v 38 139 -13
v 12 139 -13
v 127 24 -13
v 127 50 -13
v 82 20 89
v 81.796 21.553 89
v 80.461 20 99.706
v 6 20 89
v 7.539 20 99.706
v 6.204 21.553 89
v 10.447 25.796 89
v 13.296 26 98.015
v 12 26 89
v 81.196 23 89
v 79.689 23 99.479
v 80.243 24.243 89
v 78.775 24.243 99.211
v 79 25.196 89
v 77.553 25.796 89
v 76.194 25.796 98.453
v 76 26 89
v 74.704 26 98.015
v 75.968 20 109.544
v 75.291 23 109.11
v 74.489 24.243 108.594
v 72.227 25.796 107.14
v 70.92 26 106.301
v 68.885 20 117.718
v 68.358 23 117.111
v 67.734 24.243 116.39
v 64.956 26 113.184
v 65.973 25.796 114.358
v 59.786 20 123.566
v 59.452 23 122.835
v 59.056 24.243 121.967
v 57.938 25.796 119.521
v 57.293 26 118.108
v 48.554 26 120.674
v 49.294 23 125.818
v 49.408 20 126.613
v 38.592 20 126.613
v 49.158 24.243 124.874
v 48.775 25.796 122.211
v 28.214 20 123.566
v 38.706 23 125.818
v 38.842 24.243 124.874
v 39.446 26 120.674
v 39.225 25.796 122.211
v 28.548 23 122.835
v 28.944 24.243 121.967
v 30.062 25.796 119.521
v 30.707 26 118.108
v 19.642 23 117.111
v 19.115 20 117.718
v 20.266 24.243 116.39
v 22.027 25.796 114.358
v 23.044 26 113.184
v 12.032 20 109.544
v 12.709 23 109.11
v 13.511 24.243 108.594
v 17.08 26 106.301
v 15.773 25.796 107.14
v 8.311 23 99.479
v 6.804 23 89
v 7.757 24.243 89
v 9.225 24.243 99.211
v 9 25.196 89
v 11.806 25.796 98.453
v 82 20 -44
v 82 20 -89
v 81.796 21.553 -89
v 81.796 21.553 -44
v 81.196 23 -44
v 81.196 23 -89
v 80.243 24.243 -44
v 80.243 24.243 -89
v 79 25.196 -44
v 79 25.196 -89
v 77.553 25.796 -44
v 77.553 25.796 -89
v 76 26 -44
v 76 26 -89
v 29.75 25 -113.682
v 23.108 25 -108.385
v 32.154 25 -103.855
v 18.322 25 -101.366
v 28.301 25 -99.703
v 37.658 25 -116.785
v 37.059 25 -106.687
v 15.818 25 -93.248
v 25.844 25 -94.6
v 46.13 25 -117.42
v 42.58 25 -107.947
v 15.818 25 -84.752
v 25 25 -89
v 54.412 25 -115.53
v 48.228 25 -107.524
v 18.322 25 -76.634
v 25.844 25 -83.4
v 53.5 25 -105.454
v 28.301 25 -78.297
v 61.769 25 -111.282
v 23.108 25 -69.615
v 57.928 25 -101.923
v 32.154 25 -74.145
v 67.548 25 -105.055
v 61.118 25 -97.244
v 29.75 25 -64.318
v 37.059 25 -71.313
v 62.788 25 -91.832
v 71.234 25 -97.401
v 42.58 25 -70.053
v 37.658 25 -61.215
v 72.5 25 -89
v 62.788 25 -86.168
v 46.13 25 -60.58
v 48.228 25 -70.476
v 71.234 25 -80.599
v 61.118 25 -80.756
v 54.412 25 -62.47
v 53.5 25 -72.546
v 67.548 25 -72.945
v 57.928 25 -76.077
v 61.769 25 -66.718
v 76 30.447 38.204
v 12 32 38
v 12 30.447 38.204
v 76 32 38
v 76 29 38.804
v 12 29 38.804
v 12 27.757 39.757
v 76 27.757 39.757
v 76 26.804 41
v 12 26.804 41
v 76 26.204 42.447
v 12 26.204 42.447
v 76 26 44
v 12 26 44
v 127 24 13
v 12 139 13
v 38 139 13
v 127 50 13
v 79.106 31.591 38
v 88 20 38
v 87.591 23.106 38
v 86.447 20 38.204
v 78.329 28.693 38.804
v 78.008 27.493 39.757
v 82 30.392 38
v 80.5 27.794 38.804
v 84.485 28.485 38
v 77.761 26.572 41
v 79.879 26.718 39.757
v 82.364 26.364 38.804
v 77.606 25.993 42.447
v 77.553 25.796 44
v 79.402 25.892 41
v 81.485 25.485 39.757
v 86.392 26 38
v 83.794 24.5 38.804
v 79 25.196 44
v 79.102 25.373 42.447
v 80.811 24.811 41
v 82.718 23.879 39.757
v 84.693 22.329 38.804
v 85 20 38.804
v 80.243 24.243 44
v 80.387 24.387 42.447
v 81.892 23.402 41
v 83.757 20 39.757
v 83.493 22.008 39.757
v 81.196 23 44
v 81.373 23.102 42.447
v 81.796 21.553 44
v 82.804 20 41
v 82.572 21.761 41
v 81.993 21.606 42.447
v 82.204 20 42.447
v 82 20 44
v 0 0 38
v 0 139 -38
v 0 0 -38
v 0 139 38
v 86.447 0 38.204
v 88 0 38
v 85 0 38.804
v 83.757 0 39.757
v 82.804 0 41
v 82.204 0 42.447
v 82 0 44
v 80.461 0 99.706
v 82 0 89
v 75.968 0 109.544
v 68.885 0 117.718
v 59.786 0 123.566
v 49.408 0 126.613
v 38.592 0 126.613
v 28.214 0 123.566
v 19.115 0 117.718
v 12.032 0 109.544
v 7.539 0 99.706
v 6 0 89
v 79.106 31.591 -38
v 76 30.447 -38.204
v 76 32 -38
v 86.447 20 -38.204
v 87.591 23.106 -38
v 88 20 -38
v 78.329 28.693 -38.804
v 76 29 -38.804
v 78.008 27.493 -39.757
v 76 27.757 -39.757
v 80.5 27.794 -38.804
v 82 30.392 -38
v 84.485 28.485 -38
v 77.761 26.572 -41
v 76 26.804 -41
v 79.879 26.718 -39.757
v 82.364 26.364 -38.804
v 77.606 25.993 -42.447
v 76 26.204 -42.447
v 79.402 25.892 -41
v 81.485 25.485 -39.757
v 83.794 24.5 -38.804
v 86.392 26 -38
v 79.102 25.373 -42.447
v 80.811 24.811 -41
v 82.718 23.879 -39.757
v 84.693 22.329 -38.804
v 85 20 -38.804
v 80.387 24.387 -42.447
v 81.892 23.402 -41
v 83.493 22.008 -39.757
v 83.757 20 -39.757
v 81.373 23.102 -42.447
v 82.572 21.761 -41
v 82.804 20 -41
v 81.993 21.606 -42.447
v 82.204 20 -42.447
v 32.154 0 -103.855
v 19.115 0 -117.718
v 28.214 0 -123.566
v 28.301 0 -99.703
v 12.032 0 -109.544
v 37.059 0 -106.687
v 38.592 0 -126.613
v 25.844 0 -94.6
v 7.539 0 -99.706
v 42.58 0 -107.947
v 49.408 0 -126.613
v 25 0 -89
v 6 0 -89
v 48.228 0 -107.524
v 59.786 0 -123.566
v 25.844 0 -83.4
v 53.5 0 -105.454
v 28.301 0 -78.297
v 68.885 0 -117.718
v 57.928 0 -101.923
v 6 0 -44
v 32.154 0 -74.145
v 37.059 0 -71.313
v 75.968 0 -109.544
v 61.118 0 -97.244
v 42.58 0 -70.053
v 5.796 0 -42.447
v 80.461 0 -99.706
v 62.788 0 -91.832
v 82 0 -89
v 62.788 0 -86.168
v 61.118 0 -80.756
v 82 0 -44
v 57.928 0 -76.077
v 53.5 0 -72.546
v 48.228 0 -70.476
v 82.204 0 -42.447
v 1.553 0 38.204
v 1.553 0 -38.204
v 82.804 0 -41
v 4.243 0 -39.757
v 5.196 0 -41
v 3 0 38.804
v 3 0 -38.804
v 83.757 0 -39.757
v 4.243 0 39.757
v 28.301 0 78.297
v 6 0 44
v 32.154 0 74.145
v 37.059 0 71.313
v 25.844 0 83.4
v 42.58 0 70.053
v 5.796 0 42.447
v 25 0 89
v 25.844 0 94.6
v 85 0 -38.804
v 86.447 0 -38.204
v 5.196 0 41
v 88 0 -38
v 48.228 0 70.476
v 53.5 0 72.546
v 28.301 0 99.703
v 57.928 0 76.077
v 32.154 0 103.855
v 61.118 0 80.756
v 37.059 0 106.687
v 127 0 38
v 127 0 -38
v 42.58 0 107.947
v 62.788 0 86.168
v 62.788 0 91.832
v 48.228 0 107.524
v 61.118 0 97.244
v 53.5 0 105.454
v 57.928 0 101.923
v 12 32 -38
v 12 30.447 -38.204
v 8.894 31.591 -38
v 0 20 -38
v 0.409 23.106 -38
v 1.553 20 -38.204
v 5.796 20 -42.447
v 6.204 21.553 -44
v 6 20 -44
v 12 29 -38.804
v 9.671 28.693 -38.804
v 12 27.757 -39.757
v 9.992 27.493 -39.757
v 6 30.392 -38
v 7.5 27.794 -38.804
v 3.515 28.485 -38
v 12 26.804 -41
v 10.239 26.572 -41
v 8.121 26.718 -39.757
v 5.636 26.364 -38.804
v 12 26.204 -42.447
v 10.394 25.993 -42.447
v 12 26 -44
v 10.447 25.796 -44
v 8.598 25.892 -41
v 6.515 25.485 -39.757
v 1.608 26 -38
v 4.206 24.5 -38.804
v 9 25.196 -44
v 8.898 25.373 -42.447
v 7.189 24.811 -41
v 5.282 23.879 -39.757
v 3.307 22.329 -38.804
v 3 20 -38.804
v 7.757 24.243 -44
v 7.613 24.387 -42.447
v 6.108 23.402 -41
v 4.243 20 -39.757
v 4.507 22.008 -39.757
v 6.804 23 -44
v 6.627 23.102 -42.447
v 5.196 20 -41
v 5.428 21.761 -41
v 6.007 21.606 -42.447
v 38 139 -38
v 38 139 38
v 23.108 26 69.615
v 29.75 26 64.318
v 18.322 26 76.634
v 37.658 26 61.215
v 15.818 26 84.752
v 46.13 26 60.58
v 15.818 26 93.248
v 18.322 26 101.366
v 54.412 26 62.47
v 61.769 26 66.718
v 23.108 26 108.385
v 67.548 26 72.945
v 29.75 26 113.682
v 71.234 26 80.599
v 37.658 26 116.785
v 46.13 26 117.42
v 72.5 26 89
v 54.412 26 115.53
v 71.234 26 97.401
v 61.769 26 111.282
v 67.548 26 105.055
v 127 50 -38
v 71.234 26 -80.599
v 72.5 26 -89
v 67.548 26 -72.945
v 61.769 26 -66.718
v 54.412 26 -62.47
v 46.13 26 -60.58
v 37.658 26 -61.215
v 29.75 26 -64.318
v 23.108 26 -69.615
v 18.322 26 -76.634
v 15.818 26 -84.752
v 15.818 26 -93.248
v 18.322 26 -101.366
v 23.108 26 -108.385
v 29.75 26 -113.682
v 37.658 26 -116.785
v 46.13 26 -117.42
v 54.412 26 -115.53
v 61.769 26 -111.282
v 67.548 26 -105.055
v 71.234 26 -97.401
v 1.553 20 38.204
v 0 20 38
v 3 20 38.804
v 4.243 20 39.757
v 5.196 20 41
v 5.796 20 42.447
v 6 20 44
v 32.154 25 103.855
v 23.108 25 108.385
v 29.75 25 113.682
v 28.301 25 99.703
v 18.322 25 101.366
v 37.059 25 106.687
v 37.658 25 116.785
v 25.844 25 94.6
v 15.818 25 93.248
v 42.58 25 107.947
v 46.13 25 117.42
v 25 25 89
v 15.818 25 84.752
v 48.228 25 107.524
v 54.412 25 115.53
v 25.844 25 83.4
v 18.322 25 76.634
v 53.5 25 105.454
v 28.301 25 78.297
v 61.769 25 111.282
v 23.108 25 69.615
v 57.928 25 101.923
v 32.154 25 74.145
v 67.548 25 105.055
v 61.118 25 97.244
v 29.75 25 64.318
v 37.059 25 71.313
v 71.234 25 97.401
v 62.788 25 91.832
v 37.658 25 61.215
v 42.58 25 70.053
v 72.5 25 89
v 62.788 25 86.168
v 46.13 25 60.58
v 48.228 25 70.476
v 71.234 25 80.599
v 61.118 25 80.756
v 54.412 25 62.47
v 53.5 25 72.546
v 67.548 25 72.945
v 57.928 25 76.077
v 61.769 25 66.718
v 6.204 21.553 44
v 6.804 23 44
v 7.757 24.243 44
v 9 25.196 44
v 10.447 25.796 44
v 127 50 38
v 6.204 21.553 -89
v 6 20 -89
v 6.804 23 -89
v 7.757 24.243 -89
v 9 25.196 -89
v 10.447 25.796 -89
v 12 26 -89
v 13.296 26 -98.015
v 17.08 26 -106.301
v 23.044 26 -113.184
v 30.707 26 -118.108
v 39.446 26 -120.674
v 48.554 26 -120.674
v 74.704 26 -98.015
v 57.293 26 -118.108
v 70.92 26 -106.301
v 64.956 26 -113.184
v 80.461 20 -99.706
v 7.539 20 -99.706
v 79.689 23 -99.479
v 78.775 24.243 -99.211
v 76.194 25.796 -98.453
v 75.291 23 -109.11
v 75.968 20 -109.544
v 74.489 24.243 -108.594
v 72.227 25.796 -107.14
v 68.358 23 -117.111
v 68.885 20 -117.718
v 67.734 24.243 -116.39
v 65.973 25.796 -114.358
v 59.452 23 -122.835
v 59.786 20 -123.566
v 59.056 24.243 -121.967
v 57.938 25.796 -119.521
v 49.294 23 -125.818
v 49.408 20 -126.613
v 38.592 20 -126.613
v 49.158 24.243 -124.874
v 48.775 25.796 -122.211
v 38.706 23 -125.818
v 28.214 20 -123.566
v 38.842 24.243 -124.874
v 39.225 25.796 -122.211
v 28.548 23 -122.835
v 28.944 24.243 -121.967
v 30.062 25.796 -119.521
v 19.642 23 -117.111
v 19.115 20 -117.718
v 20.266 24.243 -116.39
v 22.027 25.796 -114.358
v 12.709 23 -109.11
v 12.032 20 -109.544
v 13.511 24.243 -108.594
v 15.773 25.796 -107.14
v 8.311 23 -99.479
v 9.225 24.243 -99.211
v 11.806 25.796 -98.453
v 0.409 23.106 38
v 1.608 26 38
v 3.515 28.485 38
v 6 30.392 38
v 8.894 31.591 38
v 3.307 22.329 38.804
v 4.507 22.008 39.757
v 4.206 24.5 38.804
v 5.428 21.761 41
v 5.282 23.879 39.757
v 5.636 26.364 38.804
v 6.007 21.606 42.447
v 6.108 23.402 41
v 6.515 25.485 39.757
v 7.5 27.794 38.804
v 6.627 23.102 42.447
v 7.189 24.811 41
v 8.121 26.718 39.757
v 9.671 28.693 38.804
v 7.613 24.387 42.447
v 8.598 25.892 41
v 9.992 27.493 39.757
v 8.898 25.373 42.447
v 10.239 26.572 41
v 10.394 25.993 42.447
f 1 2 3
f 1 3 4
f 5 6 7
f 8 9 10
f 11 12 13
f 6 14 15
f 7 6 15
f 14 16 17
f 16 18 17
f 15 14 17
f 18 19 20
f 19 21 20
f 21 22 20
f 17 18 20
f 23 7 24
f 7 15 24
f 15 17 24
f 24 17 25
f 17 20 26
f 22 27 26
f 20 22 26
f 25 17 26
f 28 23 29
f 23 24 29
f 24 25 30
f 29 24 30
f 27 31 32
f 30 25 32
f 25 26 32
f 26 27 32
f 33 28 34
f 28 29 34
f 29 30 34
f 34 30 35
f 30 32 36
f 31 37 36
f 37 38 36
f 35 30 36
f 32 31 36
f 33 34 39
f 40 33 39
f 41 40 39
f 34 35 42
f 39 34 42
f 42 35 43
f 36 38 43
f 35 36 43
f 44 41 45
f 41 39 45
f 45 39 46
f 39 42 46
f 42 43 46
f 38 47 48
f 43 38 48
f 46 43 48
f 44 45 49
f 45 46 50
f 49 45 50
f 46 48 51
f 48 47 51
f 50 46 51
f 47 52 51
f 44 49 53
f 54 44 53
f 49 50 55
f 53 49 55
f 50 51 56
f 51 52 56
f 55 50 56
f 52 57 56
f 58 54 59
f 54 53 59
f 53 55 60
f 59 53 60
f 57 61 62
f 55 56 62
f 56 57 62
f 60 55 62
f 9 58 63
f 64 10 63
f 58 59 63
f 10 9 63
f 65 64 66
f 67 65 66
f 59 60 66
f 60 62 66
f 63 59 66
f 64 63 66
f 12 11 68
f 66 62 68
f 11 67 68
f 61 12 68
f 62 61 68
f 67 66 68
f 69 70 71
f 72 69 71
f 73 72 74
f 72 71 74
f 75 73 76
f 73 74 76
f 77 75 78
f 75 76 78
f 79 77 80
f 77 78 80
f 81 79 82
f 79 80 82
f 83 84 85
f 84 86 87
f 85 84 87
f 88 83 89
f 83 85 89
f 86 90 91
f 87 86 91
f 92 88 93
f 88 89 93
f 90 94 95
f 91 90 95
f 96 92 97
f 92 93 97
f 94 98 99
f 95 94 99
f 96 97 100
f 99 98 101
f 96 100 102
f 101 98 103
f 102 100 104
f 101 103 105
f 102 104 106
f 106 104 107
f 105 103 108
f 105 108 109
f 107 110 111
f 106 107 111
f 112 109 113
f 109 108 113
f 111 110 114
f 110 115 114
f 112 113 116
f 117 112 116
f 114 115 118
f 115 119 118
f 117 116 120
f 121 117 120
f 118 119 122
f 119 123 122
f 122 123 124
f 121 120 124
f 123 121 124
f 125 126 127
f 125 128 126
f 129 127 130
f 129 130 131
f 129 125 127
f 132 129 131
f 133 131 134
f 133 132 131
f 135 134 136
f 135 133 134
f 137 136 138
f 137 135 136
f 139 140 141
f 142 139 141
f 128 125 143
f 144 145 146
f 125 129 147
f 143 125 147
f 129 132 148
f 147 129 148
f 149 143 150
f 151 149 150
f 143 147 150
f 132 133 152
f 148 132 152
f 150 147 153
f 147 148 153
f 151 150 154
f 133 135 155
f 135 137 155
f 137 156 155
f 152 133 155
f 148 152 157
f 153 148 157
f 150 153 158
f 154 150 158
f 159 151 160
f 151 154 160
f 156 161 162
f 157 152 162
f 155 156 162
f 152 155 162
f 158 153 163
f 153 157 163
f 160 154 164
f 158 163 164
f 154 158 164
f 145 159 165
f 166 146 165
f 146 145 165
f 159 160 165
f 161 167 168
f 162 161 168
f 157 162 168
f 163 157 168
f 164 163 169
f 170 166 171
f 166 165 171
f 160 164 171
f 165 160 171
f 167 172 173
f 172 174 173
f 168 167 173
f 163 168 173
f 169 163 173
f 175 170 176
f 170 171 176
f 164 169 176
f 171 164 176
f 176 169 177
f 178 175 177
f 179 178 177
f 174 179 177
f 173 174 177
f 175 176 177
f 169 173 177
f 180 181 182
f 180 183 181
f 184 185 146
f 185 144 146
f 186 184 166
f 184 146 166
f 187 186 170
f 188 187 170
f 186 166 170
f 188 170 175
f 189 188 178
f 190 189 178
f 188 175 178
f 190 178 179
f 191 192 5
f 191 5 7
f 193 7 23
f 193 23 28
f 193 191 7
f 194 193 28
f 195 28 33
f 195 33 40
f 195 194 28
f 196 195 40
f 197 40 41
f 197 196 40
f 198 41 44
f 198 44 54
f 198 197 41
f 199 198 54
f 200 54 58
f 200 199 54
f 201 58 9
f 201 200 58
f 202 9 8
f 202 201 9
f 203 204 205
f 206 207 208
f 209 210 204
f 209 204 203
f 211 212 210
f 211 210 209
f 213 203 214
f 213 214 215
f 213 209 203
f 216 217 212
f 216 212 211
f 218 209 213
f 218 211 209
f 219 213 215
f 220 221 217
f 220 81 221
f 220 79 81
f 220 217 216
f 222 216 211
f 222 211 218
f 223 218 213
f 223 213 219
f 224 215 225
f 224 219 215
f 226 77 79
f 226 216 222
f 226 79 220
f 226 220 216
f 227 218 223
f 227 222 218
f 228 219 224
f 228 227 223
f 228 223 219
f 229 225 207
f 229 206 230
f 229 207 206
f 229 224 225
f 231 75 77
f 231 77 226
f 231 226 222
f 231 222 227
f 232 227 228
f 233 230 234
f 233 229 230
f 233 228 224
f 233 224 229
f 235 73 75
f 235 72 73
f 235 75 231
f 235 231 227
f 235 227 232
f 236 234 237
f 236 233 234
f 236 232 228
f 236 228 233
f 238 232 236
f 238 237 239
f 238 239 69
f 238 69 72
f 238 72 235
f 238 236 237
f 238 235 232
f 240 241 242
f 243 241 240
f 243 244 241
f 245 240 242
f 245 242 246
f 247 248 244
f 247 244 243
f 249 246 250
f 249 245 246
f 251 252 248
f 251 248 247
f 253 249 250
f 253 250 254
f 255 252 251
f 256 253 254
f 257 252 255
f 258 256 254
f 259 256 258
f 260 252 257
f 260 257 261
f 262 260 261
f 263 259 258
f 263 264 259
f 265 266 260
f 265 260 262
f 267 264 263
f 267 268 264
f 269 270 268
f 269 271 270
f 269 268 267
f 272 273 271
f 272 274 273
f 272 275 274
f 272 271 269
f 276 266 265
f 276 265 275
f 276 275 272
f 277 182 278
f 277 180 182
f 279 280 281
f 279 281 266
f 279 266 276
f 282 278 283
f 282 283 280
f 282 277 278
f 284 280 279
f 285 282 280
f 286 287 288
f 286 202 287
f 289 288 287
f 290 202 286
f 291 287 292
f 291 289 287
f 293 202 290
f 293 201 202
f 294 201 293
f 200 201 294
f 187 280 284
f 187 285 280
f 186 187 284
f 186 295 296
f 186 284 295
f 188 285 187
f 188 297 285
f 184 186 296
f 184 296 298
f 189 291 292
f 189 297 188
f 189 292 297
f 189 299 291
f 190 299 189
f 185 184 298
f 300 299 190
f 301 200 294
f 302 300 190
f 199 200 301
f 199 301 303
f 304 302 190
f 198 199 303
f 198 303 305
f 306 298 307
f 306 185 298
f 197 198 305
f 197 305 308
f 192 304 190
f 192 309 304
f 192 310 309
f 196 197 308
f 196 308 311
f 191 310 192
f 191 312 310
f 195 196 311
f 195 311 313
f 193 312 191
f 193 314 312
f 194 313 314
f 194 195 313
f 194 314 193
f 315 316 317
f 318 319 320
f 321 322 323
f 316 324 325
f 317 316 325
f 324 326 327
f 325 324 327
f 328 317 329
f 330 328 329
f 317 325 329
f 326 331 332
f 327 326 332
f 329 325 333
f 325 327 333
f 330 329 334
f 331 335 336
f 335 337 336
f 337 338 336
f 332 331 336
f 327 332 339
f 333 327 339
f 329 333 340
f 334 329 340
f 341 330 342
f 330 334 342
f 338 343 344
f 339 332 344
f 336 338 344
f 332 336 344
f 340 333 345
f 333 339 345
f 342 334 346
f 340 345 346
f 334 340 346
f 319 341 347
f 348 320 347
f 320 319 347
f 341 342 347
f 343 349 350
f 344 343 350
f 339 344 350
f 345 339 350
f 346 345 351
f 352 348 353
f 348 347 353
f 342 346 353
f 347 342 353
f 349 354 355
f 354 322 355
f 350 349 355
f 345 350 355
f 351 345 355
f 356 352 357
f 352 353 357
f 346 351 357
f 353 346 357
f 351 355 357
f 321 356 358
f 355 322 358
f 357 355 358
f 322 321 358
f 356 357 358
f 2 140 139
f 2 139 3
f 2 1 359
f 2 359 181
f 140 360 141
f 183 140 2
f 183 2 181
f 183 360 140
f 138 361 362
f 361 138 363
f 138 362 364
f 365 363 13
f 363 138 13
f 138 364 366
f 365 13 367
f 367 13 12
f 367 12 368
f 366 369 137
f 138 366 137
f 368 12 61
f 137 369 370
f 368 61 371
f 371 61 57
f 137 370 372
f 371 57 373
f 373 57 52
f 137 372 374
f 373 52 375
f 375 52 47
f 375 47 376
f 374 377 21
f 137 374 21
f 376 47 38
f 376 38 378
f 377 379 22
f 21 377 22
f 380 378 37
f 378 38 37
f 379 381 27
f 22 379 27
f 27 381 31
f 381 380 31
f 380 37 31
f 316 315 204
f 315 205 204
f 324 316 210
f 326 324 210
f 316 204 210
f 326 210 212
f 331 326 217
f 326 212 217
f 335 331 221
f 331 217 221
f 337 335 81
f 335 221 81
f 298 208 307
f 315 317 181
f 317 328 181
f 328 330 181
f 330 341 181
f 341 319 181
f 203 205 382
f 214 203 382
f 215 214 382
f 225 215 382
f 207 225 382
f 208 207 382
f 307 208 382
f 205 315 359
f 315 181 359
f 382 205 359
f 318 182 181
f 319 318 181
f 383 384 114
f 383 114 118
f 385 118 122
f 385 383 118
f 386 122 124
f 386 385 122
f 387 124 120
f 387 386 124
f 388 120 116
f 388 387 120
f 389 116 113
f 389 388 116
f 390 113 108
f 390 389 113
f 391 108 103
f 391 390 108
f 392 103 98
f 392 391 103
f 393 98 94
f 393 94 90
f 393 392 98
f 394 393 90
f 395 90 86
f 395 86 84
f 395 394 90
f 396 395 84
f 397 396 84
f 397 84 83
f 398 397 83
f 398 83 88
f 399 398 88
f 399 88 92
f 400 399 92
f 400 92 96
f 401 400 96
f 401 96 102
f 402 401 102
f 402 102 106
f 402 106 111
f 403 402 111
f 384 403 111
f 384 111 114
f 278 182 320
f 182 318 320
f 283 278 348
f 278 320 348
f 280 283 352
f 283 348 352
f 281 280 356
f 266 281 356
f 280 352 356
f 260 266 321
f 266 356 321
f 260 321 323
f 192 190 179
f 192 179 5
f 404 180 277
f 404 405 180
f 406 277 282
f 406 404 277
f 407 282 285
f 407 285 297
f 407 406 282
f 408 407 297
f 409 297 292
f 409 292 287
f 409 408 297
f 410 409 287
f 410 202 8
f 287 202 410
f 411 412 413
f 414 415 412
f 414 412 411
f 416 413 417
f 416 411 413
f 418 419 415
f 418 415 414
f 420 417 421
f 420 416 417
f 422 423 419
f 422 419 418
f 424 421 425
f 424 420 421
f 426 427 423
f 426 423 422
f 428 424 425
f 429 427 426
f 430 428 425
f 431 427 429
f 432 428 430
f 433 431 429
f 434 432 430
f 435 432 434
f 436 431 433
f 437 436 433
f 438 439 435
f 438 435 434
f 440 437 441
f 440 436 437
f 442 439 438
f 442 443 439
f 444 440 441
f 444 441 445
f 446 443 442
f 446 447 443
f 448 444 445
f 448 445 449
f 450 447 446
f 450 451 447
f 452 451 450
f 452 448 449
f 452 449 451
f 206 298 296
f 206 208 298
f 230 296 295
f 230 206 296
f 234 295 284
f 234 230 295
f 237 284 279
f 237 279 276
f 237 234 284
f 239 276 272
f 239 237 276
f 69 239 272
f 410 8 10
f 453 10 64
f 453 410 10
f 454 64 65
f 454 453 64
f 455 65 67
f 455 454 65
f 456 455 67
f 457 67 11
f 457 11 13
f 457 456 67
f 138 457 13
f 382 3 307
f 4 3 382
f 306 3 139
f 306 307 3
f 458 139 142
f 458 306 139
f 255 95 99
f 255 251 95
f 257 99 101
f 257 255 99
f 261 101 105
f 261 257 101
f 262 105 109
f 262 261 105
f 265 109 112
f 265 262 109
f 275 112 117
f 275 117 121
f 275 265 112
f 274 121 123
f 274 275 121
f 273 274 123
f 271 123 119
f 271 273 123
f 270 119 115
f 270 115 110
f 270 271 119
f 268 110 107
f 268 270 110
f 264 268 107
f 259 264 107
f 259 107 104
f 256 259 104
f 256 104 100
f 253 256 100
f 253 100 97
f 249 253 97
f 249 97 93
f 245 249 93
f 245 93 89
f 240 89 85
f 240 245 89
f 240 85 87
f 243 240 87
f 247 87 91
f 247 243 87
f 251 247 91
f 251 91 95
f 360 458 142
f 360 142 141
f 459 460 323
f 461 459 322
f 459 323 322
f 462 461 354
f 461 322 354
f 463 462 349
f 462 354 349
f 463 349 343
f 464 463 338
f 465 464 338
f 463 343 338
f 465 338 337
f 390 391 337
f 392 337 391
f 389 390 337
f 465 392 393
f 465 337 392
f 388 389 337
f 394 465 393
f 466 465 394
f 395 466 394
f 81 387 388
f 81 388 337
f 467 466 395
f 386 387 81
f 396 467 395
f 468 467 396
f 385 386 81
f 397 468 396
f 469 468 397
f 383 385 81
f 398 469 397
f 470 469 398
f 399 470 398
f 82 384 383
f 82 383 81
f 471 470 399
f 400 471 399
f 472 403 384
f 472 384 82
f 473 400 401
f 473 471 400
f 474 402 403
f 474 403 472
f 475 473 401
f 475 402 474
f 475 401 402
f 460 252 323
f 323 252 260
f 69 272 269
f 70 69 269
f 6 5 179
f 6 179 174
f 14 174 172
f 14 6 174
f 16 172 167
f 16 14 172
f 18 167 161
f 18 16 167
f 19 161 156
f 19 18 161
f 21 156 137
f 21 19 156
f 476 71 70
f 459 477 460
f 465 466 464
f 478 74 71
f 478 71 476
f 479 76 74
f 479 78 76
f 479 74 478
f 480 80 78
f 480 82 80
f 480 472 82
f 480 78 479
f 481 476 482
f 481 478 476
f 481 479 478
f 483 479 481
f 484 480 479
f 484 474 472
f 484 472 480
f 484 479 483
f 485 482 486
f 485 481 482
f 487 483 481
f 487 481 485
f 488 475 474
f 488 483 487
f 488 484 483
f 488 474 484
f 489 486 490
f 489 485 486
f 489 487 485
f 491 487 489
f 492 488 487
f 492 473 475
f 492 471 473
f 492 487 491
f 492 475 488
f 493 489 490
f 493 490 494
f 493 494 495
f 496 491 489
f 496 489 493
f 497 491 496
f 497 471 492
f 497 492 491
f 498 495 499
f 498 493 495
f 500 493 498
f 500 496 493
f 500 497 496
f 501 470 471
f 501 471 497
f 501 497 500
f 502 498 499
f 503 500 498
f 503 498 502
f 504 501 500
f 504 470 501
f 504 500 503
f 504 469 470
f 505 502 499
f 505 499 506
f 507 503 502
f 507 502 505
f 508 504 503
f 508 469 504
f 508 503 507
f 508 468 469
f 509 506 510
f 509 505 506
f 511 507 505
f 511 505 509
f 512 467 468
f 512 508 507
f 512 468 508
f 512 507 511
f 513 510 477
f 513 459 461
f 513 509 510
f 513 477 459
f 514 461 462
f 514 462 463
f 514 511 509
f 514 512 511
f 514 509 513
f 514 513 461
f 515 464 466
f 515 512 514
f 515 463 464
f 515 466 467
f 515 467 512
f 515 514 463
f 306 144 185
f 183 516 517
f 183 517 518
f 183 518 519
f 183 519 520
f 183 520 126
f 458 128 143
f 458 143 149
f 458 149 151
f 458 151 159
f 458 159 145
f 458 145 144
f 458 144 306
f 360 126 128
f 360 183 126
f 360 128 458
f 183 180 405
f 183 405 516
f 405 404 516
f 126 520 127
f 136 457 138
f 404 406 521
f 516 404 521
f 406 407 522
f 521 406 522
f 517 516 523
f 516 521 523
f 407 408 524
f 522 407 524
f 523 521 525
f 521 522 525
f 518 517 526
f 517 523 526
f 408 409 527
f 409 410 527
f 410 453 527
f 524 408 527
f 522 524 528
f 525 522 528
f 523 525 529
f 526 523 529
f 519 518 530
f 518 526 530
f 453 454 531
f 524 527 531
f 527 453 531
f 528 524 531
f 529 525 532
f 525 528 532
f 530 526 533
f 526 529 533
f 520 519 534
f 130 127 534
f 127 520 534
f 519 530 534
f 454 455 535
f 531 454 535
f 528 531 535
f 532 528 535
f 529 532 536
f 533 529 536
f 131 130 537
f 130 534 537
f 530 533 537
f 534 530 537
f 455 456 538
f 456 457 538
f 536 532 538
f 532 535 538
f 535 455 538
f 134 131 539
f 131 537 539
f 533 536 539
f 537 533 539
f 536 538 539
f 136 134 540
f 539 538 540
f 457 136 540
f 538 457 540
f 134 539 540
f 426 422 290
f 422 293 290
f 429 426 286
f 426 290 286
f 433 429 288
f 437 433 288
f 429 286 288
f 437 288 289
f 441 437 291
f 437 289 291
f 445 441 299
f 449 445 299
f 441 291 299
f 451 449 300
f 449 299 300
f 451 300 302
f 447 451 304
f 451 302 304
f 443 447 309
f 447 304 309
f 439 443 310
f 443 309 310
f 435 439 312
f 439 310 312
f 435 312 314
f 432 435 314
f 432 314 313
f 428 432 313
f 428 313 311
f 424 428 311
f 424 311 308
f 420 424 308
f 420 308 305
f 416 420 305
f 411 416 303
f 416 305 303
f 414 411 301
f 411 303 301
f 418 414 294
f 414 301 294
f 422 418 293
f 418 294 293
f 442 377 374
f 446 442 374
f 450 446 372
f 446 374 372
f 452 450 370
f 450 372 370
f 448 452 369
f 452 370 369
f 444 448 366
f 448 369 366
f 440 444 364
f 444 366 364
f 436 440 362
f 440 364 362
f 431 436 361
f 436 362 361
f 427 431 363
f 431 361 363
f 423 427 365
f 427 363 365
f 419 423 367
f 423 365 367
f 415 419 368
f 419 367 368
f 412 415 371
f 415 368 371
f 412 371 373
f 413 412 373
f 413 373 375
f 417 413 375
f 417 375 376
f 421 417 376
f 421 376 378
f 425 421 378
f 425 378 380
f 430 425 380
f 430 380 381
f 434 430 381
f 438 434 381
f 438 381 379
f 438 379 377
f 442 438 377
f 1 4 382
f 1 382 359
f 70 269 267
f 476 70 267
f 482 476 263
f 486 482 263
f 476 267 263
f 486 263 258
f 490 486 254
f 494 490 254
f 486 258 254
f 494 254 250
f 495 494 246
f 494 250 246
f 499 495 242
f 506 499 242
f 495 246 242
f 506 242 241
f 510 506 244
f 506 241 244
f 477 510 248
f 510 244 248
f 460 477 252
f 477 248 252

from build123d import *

# Parameters (mm, degrees)
EXTRUDE_1_DEPTH               = 38
SKETCH_2_W                    = 52
SKETCH_2_H                    = 26
CUT_EXTRUDE_1_DEPTH           = 273.053680503
EXTRUDE_2_DEPTH               = 26
HOLE_WIZARD_M36_1_D           = 38
HOLE_WIZARD_M36_1_CBORE_D     = 57
HOLE_WIZARD_M36_1_CBORE_DEPTH = 1
FILLET_2_R                    = 6


with BuildPart() as part:
    # 스케치1 → 보스-돌출1 (new, symmetric)
    with BuildSketch(Plane.XY):
        Polygon((0, 0), (127, 0), (127, 50), (38, 139), (0, 139), align=None)
    extrude(amount=EXTRUDE_1_DEPTH, both=True)

    # 스케치2 → 컷-돌출1 (cut, through all, along a direction that is not the sketch's normal)
    with BuildSketch(Plane(origin=(0, 139, 0), x_dir=(1, 0, 0), z_dir=(0, 1, 0))):
        with Locations((38, 0)):
            Rectangle(SKETCH_2_W, SKETCH_2_H)
    extrude(amount=-CUT_EXTRUDE_1_DEPTH, dir=(-0.7071067811865512, 0.7071067811865438, 0), mode=Mode.SUBTRACT)

    # 스케치3 → 보스-돌출2 (add)
    with BuildSketch(Plane.XZ):
        with BuildLine():
            Line((6, 38), (82, 38))
            Line((82, 38), (82, 89))
            ThreePointArc((82, 89), (44, 127), (6, 89))
            Line((6, 89), (6, 38))
        make_face()
    extrude_2 = extrude(amount=-EXTRUDE_2_DEPTH)

    # M36 소켓 머리 캡 나사용 카운터보어1 (through all)
    with Locations(Plane(origin=(0, 26, 0), x_dir=(1, 0, 0), z_dir=(0, 1, 0))):
        with Locations((44, -89)):
            hole_wizard_m36_1 = CounterBoreHole(HOLE_WIZARD_M36_1_D / 2, HOLE_WIZARD_M36_1_CBORE_D / 2, HOLE_WIZARD_M36_1_CBORE_DEPTH)

    # 대칭 복사1: 보스-돌출2, M36 소켓 머리 캡 나사용 카운터보어1 across plane
    add(extrude_2.mirror(Plane.XY))
    add(hole_wizard_m36_1.mirror(Plane.XY), mode=Mode.SUBTRACT)

    # 필렛2
    fillet_2_edges = [part.edges().sort_by_distance(p)[0] for p in [
        (6, 26, 63.5),
        (6, 13, 38),
        (44, 26, 127),
        (82, 26, 63.5),
        (44, 26, 38),
        (82, 13, 38),
        (6, 13, -38),
        (82, 13, -38),
        (6, 26, -63.5),
        (44, 26, -38),
        (82, 26, -63.5),
        (44, 26, -127),
    ]]
    fillet(fillet_2_edges, radius=FILLET_2_R - 0.0001)  # a hair under: the kernel refuses the full size


solid = part.part
